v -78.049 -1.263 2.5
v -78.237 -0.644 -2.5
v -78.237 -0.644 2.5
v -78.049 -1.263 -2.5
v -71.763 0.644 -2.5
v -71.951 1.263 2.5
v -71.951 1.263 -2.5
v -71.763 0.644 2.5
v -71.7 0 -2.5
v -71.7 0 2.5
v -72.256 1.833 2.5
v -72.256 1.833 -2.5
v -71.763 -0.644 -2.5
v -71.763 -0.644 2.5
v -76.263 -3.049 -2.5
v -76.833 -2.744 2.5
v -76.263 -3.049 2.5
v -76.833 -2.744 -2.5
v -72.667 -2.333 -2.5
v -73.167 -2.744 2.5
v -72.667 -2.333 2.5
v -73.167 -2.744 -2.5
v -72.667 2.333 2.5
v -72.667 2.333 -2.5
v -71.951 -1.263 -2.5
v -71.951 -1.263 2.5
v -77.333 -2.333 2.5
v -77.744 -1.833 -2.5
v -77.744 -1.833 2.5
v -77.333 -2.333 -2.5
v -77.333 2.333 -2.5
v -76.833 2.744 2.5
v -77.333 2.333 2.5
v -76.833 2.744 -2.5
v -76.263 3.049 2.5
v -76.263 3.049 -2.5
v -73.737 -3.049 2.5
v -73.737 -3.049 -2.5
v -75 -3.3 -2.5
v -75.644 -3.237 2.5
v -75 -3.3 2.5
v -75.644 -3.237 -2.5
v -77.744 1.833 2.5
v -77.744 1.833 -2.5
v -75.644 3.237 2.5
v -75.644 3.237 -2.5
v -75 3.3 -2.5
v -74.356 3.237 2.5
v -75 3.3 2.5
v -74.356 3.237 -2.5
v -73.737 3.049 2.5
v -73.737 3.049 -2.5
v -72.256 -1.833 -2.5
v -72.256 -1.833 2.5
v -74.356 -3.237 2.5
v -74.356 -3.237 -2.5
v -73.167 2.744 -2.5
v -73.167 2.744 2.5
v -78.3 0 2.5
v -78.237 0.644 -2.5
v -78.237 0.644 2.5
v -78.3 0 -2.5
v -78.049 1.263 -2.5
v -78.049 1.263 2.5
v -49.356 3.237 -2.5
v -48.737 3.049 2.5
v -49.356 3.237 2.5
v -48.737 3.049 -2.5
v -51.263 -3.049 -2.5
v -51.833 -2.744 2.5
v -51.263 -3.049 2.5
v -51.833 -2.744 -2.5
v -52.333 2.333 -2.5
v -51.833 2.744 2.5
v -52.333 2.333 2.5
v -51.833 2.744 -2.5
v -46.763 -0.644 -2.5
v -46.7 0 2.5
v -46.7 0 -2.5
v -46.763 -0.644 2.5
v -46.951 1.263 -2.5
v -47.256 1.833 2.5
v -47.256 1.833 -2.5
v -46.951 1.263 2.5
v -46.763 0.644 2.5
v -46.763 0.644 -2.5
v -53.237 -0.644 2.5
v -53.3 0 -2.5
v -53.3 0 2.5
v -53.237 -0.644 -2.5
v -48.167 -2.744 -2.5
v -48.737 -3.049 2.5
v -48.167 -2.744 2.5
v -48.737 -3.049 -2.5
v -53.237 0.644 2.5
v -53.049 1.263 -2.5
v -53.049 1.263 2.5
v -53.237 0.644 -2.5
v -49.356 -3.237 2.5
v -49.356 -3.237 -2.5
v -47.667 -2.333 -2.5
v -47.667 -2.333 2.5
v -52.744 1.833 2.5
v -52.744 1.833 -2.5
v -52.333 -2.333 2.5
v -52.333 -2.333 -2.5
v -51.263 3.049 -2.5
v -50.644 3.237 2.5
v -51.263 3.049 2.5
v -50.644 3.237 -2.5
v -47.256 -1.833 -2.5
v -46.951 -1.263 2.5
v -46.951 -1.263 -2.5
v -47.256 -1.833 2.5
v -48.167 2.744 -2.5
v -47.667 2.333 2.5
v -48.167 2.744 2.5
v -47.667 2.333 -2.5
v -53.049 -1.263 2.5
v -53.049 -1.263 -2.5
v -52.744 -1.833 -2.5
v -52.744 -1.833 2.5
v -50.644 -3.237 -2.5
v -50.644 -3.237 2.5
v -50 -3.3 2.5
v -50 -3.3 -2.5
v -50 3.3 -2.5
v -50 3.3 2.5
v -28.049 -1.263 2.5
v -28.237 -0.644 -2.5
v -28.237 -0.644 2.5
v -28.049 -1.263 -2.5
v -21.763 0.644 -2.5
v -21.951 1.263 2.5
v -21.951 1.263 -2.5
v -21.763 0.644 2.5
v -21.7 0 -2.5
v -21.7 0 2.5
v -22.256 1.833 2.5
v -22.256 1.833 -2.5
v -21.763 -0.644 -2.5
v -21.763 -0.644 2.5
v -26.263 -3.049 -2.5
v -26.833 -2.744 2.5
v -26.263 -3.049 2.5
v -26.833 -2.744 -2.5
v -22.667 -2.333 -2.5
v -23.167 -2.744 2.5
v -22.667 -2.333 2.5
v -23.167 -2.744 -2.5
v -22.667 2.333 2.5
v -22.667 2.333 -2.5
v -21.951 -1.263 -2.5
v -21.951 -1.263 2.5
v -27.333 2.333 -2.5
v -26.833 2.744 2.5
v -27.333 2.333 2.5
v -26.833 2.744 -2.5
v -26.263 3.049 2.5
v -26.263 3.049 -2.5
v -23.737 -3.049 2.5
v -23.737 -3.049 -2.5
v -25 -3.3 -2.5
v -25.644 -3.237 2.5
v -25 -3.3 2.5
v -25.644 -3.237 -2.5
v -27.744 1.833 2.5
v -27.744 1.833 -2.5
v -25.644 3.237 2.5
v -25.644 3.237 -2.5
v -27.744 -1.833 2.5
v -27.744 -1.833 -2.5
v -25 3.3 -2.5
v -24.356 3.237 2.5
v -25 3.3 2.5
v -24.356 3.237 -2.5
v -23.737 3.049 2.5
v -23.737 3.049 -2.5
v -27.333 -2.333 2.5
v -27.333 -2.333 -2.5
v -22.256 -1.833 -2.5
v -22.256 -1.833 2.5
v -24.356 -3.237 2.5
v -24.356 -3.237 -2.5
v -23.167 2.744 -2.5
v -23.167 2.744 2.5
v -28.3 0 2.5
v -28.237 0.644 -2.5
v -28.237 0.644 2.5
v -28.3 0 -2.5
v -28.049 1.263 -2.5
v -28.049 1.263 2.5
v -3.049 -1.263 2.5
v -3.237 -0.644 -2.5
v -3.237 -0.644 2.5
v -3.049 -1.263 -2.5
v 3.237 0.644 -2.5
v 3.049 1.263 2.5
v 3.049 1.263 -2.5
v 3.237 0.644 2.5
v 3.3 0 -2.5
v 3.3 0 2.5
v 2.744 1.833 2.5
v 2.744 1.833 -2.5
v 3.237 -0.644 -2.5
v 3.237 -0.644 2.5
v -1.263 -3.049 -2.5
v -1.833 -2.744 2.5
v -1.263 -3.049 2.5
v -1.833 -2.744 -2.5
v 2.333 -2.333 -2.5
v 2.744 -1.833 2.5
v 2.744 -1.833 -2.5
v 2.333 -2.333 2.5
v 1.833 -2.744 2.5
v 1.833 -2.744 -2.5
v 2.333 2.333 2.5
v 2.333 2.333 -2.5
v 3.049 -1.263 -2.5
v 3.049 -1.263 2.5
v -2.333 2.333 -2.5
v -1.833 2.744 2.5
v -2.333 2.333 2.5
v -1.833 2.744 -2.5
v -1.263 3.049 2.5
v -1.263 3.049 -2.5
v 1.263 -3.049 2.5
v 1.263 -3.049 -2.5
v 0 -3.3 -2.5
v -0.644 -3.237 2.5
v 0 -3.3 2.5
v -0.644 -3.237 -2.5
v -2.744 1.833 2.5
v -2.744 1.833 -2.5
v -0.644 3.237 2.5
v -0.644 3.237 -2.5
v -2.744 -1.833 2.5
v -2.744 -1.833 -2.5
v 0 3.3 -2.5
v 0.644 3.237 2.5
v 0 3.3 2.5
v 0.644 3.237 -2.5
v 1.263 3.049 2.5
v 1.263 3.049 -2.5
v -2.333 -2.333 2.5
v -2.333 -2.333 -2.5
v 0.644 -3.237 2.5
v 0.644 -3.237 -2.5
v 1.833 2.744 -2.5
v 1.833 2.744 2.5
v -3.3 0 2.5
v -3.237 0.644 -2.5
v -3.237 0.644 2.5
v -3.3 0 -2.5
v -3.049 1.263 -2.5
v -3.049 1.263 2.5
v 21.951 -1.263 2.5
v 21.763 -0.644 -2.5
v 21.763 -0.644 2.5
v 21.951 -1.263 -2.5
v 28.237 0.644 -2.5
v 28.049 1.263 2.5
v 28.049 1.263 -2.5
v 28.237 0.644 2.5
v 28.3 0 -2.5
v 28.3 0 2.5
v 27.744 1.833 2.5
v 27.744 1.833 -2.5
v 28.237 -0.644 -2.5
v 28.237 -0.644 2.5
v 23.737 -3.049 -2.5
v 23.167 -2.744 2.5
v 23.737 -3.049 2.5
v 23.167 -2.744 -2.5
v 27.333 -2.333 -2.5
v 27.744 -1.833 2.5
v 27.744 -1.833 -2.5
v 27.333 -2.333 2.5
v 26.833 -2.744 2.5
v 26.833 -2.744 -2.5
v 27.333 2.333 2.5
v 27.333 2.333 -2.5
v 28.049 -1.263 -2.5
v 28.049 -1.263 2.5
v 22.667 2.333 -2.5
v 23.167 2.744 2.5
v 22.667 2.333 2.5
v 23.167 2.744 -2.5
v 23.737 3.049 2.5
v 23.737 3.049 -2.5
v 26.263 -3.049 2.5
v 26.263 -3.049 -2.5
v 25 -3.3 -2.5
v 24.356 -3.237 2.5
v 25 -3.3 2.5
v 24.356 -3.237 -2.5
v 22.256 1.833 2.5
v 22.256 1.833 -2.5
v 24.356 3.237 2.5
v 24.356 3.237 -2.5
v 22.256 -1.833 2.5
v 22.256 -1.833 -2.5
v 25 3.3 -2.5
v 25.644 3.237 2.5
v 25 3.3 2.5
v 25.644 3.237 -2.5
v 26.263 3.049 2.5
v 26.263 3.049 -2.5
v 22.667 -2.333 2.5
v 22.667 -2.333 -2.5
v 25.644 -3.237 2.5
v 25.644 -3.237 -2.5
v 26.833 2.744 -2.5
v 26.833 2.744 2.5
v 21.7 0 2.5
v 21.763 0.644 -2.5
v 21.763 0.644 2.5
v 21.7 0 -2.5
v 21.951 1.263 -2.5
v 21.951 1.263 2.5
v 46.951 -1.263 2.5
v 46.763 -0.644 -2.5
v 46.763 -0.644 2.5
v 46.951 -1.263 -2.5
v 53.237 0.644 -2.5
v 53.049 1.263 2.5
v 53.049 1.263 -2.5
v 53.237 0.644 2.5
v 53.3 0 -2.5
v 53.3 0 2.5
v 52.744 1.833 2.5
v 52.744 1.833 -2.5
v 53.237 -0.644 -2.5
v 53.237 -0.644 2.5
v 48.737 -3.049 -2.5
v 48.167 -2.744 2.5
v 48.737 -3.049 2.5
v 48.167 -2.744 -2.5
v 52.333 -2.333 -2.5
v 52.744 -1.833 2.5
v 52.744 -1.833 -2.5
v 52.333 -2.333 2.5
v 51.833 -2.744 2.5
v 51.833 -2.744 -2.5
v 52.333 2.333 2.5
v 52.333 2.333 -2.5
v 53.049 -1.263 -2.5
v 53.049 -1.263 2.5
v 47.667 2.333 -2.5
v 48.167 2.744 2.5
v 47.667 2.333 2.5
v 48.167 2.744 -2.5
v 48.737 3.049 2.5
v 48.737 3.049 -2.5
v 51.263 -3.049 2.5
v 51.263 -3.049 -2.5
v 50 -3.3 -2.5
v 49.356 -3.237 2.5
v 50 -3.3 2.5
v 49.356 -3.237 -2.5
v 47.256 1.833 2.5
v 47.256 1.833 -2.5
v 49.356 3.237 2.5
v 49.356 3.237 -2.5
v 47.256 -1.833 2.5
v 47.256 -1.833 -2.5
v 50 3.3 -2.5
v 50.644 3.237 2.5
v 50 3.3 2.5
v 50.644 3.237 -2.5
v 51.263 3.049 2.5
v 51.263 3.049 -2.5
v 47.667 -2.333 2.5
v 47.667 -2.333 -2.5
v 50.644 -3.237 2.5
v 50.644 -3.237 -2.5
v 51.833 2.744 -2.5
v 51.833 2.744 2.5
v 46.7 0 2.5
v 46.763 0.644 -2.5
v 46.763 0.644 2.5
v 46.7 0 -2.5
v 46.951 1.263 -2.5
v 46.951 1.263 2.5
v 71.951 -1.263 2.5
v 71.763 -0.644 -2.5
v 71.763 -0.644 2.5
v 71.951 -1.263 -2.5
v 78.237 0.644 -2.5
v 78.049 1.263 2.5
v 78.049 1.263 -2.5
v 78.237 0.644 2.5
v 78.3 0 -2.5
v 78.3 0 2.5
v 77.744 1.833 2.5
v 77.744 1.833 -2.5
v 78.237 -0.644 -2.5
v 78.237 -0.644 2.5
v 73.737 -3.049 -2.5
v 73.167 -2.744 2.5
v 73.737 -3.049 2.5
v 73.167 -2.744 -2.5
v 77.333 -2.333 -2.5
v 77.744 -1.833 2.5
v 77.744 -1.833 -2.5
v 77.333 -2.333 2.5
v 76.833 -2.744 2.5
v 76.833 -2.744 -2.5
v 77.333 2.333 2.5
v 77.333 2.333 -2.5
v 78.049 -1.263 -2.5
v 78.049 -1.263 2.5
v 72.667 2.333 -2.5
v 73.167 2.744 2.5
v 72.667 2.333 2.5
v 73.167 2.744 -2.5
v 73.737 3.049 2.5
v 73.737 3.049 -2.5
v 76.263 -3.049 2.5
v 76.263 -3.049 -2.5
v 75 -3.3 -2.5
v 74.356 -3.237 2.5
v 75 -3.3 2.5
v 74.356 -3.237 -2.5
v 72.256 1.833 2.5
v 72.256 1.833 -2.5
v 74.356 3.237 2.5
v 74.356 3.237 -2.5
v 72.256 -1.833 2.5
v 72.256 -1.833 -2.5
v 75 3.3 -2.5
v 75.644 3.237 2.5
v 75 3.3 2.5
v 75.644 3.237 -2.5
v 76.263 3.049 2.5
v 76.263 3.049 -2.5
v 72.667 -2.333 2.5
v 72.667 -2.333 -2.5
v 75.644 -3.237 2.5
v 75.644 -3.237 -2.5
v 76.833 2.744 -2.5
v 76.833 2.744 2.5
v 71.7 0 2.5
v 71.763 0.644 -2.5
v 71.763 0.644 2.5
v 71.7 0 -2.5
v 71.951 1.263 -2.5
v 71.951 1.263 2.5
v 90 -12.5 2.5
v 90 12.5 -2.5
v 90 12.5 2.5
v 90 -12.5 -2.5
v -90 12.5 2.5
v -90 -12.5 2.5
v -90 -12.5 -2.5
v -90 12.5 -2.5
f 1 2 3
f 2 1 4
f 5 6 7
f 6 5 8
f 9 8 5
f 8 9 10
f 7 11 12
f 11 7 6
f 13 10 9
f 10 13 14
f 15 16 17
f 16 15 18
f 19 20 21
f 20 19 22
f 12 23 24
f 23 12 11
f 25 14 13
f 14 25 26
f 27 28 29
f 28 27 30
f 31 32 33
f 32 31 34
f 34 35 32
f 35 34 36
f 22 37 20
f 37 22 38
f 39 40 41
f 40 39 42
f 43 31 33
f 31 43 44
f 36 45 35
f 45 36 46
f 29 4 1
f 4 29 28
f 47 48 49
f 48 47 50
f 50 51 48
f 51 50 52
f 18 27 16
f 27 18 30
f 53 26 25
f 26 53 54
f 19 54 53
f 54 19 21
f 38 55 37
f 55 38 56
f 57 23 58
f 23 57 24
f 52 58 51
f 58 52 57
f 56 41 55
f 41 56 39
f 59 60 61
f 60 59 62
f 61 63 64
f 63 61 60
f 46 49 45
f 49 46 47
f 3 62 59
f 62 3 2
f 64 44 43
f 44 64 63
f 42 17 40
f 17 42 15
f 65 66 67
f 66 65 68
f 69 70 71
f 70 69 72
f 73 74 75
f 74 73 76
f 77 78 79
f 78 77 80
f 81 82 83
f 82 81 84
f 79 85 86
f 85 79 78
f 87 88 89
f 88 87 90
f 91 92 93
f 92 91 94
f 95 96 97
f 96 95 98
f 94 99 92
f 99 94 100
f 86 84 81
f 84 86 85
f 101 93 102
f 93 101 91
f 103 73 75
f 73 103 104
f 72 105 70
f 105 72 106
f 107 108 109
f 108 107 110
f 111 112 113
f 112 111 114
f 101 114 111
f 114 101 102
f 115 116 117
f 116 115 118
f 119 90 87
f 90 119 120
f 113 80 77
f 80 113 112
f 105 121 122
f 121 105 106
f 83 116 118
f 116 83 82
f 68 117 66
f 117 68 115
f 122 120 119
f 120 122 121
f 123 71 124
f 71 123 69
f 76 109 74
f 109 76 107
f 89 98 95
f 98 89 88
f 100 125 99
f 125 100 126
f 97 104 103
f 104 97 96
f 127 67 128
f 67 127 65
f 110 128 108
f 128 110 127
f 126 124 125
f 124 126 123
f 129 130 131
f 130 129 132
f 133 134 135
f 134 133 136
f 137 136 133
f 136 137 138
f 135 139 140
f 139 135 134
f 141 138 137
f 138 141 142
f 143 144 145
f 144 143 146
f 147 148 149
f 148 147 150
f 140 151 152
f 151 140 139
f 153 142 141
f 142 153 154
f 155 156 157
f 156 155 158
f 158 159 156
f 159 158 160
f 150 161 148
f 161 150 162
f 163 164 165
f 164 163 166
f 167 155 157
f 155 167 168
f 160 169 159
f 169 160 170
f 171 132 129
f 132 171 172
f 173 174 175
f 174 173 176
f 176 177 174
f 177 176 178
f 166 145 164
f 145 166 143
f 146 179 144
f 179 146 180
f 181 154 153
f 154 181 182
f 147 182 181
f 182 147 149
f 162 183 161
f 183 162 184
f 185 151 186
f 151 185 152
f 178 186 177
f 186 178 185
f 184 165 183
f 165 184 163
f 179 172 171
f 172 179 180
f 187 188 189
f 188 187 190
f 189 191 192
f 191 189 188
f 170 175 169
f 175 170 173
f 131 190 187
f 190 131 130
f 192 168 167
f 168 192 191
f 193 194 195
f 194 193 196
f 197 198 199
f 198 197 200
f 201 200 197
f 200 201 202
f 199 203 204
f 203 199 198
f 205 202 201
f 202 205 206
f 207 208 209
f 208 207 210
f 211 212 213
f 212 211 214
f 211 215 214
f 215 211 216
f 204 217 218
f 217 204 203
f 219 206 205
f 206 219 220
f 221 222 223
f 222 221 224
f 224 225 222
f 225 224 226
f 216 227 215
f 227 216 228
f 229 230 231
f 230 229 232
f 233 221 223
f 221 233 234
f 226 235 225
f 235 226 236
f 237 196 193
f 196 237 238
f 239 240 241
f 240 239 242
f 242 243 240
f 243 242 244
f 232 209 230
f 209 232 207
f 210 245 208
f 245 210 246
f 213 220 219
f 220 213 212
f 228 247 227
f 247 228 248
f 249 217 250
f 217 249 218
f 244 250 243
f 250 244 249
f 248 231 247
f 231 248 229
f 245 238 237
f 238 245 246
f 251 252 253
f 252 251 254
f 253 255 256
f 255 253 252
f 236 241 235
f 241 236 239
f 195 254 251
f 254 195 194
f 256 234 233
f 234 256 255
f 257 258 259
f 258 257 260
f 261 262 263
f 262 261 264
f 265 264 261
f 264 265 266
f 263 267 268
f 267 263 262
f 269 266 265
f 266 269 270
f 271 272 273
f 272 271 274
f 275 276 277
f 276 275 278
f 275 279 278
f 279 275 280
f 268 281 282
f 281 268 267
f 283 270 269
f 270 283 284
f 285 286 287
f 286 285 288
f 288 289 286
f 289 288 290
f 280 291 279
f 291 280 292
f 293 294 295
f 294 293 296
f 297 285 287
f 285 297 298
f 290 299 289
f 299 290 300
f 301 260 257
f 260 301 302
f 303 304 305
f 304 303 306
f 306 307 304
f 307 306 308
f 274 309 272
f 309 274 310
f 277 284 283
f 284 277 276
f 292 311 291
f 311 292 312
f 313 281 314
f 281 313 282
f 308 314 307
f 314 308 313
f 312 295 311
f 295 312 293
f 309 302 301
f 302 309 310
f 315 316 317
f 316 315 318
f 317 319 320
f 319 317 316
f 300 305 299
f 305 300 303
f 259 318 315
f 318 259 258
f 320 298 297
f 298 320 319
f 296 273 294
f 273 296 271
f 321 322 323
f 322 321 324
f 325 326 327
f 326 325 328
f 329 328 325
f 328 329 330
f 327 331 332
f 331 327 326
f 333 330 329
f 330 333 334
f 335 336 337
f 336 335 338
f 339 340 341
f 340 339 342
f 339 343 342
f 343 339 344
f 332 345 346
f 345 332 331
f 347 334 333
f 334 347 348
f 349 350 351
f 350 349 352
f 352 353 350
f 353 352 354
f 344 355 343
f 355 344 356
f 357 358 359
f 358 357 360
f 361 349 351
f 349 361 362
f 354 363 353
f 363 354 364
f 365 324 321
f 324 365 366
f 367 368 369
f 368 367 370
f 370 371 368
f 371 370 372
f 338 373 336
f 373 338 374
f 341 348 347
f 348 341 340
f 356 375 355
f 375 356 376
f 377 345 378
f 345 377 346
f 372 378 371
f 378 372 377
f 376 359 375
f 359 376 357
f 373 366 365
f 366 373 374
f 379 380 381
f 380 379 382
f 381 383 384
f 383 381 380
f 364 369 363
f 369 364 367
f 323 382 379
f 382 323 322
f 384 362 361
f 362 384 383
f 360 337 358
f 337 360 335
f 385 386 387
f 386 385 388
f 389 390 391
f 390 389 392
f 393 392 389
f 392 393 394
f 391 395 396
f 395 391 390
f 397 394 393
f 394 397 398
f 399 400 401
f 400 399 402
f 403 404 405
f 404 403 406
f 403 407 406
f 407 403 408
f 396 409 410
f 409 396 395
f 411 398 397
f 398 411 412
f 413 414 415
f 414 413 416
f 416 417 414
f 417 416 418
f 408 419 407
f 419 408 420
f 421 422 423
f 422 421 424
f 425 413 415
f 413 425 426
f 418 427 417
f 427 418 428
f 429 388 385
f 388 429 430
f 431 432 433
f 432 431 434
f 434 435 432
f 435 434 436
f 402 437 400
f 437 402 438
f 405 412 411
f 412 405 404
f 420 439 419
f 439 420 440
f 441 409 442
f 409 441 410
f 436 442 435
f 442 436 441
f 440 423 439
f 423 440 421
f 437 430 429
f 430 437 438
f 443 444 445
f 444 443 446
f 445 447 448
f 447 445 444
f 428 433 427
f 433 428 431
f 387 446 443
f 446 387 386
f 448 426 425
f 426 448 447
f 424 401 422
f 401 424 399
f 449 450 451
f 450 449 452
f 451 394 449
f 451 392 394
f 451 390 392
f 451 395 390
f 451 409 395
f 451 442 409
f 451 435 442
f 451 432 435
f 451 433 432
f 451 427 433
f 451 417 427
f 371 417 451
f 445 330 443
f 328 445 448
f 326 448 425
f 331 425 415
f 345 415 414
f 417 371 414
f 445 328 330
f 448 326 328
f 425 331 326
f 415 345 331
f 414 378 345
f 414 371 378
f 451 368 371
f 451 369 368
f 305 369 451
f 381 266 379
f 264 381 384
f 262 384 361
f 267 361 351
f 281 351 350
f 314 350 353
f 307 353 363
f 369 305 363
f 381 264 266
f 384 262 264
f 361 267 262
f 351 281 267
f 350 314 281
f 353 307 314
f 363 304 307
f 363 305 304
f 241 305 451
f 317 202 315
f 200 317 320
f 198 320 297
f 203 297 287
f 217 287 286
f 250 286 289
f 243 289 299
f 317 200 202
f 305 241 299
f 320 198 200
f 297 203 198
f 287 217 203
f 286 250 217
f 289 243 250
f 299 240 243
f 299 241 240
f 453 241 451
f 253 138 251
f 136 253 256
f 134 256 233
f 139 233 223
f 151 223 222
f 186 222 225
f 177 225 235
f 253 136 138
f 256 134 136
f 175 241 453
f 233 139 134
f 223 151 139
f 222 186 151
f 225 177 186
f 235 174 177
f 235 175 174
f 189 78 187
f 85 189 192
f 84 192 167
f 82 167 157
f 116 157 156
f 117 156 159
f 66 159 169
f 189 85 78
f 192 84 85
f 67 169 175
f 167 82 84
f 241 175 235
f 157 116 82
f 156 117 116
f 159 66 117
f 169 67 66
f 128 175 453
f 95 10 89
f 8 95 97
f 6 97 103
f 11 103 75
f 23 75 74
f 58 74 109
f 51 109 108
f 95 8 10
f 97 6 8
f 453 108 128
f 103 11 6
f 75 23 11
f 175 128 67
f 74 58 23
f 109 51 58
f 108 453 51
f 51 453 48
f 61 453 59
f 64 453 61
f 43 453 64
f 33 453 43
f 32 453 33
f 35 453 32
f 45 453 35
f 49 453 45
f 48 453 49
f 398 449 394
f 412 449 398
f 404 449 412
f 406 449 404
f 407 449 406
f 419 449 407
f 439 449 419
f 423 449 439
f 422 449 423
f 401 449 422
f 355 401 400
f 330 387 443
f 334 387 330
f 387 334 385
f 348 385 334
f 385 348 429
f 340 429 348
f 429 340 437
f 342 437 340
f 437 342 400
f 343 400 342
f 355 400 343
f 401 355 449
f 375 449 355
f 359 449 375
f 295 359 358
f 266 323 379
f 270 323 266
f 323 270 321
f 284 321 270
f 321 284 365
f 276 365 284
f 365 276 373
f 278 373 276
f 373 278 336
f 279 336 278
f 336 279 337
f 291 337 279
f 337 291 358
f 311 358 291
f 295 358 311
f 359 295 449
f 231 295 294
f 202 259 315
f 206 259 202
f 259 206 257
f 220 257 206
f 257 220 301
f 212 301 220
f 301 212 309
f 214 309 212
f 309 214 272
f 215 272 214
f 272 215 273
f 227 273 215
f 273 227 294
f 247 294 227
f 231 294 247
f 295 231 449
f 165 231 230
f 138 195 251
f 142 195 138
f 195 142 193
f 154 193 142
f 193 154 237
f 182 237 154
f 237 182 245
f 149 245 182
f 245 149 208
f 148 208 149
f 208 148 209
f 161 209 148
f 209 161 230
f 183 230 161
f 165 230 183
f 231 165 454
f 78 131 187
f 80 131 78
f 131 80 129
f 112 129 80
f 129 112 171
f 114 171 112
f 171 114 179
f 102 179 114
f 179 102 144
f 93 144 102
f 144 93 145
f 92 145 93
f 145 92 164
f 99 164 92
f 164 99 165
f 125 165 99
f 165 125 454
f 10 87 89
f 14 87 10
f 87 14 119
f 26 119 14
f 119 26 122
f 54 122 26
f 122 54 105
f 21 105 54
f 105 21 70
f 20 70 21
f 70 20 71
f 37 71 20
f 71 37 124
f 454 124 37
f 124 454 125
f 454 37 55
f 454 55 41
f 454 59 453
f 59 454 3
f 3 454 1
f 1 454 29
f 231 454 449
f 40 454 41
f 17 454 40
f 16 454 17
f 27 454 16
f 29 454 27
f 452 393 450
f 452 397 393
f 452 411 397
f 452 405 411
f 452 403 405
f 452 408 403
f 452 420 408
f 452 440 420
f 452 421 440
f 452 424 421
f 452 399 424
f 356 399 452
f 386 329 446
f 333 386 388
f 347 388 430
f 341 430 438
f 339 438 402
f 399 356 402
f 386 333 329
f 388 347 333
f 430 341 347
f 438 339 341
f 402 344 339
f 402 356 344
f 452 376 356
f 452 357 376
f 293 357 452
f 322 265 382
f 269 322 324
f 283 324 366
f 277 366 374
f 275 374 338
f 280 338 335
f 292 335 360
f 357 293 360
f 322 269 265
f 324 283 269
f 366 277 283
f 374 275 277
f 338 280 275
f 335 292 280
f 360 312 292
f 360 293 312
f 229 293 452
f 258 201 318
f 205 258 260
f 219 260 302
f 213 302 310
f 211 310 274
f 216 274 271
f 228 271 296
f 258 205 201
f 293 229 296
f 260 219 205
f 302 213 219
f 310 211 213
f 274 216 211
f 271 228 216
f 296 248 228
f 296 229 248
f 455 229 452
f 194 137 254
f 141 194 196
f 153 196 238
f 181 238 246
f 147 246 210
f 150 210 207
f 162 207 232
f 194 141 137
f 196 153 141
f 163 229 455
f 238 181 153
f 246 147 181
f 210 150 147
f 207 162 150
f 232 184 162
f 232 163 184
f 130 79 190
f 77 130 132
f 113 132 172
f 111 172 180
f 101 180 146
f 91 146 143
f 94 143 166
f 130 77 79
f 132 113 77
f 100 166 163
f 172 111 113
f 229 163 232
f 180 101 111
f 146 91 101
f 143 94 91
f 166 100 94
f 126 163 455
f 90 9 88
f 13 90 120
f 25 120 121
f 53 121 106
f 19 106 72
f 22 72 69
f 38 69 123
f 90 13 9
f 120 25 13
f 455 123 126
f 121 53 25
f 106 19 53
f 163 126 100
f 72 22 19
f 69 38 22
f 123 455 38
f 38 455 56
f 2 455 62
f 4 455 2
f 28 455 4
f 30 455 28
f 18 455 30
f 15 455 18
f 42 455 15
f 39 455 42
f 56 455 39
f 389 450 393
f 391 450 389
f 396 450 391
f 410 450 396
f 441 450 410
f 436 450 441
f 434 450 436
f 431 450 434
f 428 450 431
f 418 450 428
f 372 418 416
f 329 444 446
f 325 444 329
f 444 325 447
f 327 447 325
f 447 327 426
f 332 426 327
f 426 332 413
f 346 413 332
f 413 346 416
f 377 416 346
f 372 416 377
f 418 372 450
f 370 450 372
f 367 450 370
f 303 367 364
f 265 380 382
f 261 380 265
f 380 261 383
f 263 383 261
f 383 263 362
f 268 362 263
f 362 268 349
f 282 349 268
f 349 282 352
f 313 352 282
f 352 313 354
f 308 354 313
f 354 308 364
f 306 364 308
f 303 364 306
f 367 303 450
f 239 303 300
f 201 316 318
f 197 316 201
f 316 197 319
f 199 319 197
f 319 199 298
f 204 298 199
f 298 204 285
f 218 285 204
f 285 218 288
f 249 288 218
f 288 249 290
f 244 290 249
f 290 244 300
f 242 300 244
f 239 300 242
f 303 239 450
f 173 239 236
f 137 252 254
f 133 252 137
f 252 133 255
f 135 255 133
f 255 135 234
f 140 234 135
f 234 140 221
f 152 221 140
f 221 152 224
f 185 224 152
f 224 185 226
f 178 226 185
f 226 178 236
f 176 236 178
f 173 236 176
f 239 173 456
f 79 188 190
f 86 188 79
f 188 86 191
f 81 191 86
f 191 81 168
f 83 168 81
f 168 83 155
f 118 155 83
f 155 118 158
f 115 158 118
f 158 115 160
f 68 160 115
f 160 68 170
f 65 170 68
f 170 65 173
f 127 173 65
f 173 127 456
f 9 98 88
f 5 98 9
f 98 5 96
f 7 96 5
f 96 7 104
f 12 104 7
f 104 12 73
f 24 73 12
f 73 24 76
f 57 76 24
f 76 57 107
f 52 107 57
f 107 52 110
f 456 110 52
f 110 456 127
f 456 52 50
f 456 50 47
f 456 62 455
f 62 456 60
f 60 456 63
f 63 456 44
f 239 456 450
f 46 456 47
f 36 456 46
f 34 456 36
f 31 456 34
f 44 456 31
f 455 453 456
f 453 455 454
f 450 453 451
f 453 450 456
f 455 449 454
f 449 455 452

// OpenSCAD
$fn = 32;

// ----------------------------------------------------------------------
// Hole bar, 7 x Ø6.6
// row layout, 15 mm edge offset
// ----------------------------------------------------------------------

// --- parameters (mm) ---
bar_w = 25;    // bar width (Y)
bar_t = 5;     // bar thickness (Z)
holes = 7;     // holes per row
hole_d = 6.6;  // hole diameter
edge = 15;     // offset from the bar end to the first hole
pitch = 25;    // pitch between neighbouring holes

// --- derived feature positions (mm) ---
span = (holes - 1) * pitch;   // = 150   distance between the end holes
bar_l = span + 2 * edge;      // = 180   overall bar length
start_x = -bar_l / 2 + edge;  // = -75   X of the first hole
feature_centers = [
  [start_x + 0 * pitch, 0],
  [start_x + 1 * pitch, 0],
  [start_x + 2 * pitch, 0],
  [start_x + 3 * pitch, 0],
  [start_x + 4 * pitch, 0],
  [start_x + 5 * pitch, 0],
  [start_x + 6 * pitch, 0]
];   // hole centres of the first row

// bar with one row of holes, drilled from feature_centers
difference() {
  translate([-bar_l / 2, -bar_w / 2, -bar_t / 2]) cube([bar_l, bar_w, bar_t]);
  for (centre = feature_centers)
    translate([centre[0], centre[1], 0])
      cylinder(d = hole_d, h = bar_t + 2, center = true);
}
